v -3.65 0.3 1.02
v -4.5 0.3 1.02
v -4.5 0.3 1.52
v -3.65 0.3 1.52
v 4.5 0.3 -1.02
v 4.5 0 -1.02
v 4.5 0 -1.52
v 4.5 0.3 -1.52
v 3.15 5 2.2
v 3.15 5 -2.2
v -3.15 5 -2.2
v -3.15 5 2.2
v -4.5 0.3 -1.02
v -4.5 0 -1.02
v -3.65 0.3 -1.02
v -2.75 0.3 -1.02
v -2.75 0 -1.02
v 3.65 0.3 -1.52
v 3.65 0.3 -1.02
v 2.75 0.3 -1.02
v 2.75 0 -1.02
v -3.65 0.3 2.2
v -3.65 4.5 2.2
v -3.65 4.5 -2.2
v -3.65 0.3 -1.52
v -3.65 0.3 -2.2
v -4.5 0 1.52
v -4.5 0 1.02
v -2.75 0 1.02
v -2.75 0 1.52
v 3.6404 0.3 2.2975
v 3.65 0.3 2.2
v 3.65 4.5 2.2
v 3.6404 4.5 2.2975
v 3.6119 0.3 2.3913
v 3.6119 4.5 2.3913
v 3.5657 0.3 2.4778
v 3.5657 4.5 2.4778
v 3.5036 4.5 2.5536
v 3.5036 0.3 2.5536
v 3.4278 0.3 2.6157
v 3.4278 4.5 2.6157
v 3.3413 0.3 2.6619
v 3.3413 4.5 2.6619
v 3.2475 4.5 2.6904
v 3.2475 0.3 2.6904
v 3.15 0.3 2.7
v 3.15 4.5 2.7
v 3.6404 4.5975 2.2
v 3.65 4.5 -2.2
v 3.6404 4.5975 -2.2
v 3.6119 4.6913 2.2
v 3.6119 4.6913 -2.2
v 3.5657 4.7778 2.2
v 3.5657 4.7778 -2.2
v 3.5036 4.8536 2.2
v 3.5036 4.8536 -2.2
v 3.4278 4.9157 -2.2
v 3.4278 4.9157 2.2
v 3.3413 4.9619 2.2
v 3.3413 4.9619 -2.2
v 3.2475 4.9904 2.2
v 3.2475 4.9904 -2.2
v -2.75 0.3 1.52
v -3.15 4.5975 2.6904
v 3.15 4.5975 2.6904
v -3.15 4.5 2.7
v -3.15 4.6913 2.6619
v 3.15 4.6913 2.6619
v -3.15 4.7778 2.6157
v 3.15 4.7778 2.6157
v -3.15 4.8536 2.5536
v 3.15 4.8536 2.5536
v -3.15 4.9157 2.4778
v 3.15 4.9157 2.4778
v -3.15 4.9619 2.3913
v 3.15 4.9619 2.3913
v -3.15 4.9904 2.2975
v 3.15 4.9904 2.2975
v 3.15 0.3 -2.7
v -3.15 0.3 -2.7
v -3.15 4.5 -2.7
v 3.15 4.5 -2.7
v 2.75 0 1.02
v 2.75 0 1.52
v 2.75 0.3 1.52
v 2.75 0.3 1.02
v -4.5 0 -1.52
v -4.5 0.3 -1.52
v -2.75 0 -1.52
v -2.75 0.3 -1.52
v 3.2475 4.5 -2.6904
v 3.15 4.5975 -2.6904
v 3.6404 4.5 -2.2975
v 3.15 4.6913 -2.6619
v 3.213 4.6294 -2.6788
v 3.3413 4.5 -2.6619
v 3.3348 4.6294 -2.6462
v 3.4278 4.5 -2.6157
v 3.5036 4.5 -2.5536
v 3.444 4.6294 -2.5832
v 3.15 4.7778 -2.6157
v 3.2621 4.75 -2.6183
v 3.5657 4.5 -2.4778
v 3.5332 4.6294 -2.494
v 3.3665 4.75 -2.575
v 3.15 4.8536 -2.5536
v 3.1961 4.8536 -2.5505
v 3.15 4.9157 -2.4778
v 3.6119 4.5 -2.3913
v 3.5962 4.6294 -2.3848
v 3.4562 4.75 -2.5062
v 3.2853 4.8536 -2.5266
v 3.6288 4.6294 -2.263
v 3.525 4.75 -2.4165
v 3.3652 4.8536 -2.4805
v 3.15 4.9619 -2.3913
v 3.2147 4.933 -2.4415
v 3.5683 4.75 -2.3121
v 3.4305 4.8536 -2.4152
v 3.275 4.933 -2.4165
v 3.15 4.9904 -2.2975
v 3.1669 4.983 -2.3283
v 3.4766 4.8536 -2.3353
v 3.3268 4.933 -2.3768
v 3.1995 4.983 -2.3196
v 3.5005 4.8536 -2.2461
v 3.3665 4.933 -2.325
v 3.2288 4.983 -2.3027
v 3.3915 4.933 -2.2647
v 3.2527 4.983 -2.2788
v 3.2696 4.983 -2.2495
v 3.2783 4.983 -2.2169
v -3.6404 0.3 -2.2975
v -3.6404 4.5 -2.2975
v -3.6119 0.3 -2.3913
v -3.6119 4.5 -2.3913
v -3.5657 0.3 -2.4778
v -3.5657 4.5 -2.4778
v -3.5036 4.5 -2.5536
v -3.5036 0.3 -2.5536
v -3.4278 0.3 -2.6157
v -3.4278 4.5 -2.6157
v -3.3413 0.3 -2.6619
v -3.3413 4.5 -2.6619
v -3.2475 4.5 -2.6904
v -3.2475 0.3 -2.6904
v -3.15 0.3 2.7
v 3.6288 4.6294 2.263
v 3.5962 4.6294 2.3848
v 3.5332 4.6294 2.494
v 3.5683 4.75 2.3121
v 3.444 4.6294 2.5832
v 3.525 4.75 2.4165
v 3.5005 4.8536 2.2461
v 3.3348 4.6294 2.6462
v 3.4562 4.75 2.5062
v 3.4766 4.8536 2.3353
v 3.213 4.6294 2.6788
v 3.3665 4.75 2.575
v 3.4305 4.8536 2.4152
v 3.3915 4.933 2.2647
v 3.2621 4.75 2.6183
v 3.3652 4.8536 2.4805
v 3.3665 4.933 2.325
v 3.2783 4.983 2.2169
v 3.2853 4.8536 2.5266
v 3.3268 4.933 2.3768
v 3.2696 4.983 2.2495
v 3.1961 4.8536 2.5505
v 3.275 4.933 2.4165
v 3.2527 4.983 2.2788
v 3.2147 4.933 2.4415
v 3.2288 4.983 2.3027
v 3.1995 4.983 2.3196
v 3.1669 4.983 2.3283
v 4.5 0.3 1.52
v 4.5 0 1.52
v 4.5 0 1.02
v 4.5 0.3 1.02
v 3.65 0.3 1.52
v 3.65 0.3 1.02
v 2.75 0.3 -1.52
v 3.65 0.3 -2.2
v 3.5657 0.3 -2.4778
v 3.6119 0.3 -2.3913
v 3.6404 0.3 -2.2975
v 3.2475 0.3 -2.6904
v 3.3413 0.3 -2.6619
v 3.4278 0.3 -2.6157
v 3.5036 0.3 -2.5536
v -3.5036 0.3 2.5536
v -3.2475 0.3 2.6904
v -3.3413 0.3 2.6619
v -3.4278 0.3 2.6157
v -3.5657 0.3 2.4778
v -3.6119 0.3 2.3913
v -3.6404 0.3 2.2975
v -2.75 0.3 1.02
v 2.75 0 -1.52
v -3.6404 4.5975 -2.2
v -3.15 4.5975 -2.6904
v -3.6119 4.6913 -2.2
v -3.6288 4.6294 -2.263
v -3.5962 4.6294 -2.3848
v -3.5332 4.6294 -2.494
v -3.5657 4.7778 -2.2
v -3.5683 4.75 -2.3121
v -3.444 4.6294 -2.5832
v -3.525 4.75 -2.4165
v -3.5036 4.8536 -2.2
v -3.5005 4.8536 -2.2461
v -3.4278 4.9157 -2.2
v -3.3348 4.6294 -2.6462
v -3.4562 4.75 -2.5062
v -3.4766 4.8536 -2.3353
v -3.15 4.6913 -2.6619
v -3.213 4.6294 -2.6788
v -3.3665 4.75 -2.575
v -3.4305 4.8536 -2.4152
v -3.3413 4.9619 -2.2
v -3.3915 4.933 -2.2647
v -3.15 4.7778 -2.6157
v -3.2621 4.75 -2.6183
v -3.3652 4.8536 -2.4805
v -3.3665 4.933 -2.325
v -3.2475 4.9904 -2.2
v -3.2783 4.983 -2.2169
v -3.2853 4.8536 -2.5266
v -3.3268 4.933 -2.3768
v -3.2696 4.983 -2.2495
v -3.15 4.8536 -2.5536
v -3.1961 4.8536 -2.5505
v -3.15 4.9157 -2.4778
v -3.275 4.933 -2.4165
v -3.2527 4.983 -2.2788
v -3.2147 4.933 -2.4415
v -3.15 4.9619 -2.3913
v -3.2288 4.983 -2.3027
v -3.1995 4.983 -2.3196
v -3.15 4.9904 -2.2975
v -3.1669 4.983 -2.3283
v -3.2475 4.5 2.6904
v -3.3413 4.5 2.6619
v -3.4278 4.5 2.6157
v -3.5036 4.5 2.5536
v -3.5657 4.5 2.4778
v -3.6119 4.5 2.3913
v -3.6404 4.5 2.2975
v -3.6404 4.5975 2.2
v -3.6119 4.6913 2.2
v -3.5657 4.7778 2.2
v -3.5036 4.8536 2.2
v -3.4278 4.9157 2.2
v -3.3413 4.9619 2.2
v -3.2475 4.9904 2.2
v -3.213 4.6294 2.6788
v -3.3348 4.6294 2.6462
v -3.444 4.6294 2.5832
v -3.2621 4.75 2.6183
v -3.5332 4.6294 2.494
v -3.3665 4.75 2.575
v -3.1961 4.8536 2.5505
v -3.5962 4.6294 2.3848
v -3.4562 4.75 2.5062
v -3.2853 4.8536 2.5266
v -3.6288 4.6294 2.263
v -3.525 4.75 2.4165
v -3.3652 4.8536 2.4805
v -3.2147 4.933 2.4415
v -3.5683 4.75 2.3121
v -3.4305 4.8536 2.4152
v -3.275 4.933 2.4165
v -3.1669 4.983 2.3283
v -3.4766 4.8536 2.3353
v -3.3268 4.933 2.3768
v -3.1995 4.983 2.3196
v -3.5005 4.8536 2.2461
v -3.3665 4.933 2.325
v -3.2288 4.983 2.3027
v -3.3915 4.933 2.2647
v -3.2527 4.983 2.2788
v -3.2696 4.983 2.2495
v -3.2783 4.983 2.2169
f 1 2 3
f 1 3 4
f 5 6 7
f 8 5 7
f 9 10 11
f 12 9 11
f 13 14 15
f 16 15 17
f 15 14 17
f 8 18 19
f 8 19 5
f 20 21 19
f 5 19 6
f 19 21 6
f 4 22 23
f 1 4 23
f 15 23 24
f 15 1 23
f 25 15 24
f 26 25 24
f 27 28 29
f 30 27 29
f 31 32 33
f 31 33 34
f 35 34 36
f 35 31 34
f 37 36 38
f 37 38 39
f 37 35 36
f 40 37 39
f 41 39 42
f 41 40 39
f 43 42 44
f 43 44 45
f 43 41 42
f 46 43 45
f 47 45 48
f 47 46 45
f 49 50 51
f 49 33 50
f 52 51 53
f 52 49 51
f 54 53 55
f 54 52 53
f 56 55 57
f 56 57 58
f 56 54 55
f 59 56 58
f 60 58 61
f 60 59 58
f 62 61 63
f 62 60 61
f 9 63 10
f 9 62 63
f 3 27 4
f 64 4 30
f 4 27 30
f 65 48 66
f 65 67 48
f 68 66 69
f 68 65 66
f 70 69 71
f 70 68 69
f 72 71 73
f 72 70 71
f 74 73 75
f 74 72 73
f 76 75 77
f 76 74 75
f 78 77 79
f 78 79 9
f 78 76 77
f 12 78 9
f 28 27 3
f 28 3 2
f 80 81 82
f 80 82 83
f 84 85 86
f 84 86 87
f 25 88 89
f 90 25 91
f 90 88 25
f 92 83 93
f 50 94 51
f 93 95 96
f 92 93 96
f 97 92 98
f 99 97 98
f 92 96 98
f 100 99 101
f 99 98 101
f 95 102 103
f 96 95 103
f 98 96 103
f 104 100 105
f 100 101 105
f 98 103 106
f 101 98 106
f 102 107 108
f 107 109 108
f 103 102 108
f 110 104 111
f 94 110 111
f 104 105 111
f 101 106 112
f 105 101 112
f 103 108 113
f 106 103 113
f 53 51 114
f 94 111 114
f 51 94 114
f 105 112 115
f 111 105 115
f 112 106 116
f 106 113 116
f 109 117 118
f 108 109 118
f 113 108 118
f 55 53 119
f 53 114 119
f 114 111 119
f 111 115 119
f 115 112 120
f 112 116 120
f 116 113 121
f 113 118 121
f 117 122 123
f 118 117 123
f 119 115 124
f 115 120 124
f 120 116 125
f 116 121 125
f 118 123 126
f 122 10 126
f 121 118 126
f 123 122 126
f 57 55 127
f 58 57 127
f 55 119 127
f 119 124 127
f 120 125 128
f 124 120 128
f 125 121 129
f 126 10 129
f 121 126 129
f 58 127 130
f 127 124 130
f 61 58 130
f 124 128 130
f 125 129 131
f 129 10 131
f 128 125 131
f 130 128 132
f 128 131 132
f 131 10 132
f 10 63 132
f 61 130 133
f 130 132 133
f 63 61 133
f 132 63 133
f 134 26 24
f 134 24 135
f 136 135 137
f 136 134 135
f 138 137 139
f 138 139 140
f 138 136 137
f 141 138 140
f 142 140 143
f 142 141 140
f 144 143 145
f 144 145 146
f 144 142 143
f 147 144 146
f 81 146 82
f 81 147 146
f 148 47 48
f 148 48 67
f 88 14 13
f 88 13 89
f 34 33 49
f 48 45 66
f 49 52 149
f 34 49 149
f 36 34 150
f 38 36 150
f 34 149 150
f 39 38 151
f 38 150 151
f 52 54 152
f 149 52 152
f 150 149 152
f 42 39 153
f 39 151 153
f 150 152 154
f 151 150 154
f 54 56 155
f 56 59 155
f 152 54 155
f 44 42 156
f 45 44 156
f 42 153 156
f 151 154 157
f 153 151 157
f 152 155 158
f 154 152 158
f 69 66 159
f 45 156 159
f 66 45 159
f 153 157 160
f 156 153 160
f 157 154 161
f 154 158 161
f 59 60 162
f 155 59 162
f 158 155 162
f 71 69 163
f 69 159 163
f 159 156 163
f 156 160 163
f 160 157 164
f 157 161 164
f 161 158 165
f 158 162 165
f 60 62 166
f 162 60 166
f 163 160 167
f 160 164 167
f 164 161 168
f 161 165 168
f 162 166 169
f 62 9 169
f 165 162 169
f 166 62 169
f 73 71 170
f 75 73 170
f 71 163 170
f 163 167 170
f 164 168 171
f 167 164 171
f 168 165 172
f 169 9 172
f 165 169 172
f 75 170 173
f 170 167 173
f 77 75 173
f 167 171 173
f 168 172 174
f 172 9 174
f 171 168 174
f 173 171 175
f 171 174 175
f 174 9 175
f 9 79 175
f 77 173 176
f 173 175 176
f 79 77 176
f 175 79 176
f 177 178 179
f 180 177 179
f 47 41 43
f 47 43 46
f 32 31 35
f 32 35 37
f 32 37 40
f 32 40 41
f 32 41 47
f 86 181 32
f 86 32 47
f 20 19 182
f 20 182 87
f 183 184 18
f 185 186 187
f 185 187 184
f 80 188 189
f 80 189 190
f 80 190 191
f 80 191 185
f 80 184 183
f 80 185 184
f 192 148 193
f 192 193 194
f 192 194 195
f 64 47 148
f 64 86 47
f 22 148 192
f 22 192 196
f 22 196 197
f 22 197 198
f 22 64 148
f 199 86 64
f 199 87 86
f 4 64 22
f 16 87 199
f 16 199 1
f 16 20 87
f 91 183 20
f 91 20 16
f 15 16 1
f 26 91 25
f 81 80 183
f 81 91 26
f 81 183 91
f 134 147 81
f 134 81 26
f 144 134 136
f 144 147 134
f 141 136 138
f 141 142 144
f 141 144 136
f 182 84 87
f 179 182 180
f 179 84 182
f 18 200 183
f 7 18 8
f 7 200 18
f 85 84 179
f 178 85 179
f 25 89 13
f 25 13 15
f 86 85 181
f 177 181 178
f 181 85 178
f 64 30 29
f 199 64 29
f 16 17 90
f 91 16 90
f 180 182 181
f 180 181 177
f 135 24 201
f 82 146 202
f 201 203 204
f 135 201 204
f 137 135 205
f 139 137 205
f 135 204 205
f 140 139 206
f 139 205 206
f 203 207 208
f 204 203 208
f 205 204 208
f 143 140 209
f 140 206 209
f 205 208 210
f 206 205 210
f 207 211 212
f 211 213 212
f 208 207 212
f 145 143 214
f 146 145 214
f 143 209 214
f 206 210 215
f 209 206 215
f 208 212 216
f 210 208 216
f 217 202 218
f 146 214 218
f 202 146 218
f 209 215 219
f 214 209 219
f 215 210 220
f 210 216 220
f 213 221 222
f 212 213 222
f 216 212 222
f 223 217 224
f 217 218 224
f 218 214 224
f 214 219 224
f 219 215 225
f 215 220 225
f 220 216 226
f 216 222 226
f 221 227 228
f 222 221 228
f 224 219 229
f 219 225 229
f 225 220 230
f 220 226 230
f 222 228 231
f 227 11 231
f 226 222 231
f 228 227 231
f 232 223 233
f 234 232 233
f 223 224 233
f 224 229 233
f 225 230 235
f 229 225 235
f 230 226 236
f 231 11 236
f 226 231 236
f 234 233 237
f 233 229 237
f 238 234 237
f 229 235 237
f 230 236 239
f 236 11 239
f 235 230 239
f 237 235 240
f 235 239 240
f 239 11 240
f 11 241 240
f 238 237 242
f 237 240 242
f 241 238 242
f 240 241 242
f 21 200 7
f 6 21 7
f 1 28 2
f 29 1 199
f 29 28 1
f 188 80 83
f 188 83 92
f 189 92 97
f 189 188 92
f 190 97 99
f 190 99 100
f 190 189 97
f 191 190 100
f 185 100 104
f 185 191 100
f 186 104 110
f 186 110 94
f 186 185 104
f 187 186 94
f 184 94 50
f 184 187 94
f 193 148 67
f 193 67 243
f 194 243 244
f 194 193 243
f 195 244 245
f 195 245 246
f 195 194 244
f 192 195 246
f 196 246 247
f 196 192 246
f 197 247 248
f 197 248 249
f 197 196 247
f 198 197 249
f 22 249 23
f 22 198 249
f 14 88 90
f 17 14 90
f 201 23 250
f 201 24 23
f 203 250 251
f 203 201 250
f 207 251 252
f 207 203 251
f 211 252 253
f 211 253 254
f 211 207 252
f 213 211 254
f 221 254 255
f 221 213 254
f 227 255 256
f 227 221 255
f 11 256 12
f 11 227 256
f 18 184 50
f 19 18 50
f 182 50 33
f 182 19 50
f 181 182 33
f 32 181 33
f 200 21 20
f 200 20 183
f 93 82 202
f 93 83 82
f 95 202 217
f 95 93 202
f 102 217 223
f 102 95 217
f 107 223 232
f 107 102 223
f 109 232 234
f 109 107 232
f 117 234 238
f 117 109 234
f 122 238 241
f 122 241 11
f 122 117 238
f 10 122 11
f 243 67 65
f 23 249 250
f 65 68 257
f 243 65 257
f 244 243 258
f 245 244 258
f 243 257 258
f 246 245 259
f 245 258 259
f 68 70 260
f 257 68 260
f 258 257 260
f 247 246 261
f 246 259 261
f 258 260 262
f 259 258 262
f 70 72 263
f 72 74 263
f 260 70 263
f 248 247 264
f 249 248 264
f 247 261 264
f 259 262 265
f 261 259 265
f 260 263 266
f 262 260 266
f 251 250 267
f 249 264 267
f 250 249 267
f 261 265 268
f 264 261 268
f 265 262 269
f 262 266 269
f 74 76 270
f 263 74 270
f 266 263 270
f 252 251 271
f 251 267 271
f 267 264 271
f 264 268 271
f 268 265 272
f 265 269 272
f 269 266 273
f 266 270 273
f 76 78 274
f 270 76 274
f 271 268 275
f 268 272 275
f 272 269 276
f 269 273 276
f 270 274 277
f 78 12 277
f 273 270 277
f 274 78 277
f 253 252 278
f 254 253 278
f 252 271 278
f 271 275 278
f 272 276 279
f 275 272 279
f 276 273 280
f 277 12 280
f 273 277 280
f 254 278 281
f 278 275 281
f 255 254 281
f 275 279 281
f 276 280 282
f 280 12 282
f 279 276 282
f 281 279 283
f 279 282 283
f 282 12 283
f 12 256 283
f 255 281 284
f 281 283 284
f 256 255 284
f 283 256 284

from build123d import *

# Parameters (mm, degrees)
BOSS_EXTRUDE1_START = 0.3
BOSS_EXTRUDE1_DEPTH = 4.7
SKETCH2_W           = 1.75
SKETCH2_H           = 0.5
BOSS_EXTRUDE2_DEPTH = 0.3
FILLET1_R           = 0.5


with BuildPart() as part:
    # Sketch1 → Boss-Extrude1 (new body)
    with BuildSketch(Plane(origin=(0, 0, 0), x_dir=(1, 0, 0), z_dir=(0, 1, 0)).offset(BOSS_EXTRUDE1_START)):
        with BuildLine():
            Line((-3.15, 2.7), (3.15, 2.7))
            ThreePointArc((3.15, 2.7), (3.503553391, 2.553553391), (3.65, 2.2))
            Line((3.65, 2.2), (3.65, -2.2))
            ThreePointArc((3.65, -2.2), (3.503553391, -2.553553391), (3.15, -2.7))
            Line((3.15, -2.7), (-3.15, -2.7))
            ThreePointArc((-3.15, -2.7), (-3.503553391, -2.553553391), (-3.65, -2.2))
            Line((-3.65, -2.2), (-3.65, 2.2))
            ThreePointArc((-3.65, 2.2), (-3.503553391, 2.553553391), (-3.15, 2.7))
        make_face()
    extrude(amount=BOSS_EXTRUDE1_DEPTH)

    # Sketch2 → Boss-Extrude2 (add)
    with BuildSketch(Plane(origin=(0, 0, 0), x_dir=(1, 0, 0), z_dir=(0, 1, 0))):
        with Locations((3.625, -1.27)):
            Rectangle(SKETCH2_W, SKETCH2_H)
        with Locations((3.625, 1.27)):
            Rectangle(SKETCH2_W, SKETCH2_H)
        with Locations((-3.625, 1.27)):
            Rectangle(SKETCH2_W, SKETCH2_H)
        with Locations((-3.625, -1.27)):
            Rectangle(SKETCH2_W, SKETCH2_H)
    extrude(amount=BOSS_EXTRUDE2_DEPTH)

    # Fillet1
    fillet1_edges = [part.edges().sort_by_distance(p)[0] for p in [
        (3.503553391, 5, -2.553553391),
        (0, 5, -2.7),
        (-3.503553391, 5, -2.553553391),
        (-3.65, 5, 0),
        (-3.503553391, 5, 2.553553391),
        (0, 5, 2.7),
        (3.503553391, 5, 2.553553391),
        (3.65, 5, 0),
    ]]
    fillet(fillet1_edges, radius=FILLET1_R)


solid = part.part
